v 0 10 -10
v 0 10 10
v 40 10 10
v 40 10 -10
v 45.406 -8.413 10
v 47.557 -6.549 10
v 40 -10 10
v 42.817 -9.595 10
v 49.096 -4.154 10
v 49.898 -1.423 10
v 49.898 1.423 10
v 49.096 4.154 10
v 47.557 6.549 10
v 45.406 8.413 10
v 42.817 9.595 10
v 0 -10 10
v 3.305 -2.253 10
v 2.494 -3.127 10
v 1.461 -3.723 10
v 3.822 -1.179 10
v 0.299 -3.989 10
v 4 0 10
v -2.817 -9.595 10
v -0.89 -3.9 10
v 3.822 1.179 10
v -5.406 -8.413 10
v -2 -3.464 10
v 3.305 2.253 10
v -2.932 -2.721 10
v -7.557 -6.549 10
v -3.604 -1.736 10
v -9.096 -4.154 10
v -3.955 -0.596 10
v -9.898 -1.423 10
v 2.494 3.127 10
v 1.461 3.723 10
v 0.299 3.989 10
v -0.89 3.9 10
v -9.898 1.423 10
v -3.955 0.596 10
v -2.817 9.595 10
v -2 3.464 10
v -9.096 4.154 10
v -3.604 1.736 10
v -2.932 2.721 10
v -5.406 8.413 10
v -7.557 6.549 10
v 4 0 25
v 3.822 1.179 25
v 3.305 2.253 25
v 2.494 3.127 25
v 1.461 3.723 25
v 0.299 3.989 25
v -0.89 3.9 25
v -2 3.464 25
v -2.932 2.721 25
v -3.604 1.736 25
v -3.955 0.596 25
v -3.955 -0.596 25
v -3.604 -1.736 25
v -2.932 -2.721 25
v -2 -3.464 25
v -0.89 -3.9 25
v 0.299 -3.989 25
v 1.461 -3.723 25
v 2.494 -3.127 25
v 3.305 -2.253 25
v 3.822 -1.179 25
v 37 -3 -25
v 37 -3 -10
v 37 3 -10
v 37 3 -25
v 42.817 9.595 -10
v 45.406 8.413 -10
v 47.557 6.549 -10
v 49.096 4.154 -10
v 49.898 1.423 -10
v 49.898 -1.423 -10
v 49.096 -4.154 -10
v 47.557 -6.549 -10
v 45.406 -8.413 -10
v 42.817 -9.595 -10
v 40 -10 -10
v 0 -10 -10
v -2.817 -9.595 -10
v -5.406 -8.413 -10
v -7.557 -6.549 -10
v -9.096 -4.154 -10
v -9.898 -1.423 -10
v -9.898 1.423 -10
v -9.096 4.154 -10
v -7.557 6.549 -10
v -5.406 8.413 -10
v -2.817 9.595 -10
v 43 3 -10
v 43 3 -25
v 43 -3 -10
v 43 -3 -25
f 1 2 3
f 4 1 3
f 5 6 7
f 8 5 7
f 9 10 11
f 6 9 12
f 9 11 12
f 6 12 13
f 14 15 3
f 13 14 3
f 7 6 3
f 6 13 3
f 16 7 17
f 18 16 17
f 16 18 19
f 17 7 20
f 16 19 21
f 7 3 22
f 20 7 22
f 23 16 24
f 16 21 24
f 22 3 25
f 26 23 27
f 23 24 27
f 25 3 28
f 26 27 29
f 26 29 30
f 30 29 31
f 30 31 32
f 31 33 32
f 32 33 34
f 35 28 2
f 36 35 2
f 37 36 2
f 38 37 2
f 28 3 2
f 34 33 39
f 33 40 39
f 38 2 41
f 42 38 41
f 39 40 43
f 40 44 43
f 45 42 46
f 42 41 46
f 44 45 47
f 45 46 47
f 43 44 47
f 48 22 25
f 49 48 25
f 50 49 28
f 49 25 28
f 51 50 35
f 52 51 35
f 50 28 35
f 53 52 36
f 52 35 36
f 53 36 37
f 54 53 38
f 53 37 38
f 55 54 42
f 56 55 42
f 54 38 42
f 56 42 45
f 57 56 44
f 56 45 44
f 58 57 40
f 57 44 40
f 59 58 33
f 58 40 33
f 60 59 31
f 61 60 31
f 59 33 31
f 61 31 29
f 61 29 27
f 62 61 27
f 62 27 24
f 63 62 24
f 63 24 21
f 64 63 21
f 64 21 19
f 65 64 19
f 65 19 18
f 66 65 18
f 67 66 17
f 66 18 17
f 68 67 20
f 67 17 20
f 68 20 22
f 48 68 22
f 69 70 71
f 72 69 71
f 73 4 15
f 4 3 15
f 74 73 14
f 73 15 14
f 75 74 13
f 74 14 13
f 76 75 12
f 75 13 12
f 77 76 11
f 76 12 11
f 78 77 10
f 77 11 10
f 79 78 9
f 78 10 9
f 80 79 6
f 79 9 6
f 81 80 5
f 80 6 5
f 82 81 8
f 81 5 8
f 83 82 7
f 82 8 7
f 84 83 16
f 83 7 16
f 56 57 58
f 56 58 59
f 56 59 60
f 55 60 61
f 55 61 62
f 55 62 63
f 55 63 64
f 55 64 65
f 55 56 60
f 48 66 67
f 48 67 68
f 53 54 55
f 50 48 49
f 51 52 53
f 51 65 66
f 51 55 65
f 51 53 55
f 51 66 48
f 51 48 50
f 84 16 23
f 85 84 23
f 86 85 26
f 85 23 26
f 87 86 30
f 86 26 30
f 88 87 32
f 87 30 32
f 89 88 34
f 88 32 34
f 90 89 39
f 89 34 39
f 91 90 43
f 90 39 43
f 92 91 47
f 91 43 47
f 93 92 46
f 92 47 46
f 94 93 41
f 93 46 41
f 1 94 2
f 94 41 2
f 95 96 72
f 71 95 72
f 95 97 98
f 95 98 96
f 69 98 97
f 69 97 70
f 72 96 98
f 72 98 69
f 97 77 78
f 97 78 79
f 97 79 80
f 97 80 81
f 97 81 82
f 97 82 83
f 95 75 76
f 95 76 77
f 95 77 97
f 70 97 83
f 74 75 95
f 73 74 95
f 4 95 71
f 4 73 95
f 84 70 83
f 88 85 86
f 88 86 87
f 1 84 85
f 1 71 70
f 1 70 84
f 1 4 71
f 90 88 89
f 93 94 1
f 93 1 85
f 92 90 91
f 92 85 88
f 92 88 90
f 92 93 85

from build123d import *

# Parameters (mm, degrees)
EXTRUDE_1_DEPTH = 10
SKETCH_2_R      = 4
EXTRUDE_2_DEPTH = 15
SKETCH_3_W      = 6
SKETCH_3_H      = 6
EXTRUDE_3_DEPTH = 15


with BuildPart() as part:
    # 草图1 → 凸台-拉伸1 (new, symmetric)
    with BuildSketch(Plane.XY):
        with BuildLine():
            Line((0, 10), (40, 10))
            ThreePointArc((40, 10), (50, 0), (40, -10))
            Line((40, -10), (0, -10))
            ThreePointArc((0, -10), (-10, 0), (0, 10))
        make_face()
    extrude(amount=EXTRUDE_1_DEPTH, both=True)

    # 草图2 → 凸台-拉伸2 (add)
    with BuildSketch(Plane.XY.offset(10)):
        Circle(SKETCH_2_R)
    extrude(amount=EXTRUDE_2_DEPTH)

    # 草图3 → 凸台-拉伸3 (add)
    with BuildSketch(Plane(origin=(0, 0, -10), x_dir=(-1, 0, 0), z_dir=(0, 0, -1))):
        with Locations((-40, 0)):
            Rectangle(SKETCH_3_W, SKETCH_3_H)
    extrude(amount=EXTRUDE_3_DEPTH)


solid = part.part
